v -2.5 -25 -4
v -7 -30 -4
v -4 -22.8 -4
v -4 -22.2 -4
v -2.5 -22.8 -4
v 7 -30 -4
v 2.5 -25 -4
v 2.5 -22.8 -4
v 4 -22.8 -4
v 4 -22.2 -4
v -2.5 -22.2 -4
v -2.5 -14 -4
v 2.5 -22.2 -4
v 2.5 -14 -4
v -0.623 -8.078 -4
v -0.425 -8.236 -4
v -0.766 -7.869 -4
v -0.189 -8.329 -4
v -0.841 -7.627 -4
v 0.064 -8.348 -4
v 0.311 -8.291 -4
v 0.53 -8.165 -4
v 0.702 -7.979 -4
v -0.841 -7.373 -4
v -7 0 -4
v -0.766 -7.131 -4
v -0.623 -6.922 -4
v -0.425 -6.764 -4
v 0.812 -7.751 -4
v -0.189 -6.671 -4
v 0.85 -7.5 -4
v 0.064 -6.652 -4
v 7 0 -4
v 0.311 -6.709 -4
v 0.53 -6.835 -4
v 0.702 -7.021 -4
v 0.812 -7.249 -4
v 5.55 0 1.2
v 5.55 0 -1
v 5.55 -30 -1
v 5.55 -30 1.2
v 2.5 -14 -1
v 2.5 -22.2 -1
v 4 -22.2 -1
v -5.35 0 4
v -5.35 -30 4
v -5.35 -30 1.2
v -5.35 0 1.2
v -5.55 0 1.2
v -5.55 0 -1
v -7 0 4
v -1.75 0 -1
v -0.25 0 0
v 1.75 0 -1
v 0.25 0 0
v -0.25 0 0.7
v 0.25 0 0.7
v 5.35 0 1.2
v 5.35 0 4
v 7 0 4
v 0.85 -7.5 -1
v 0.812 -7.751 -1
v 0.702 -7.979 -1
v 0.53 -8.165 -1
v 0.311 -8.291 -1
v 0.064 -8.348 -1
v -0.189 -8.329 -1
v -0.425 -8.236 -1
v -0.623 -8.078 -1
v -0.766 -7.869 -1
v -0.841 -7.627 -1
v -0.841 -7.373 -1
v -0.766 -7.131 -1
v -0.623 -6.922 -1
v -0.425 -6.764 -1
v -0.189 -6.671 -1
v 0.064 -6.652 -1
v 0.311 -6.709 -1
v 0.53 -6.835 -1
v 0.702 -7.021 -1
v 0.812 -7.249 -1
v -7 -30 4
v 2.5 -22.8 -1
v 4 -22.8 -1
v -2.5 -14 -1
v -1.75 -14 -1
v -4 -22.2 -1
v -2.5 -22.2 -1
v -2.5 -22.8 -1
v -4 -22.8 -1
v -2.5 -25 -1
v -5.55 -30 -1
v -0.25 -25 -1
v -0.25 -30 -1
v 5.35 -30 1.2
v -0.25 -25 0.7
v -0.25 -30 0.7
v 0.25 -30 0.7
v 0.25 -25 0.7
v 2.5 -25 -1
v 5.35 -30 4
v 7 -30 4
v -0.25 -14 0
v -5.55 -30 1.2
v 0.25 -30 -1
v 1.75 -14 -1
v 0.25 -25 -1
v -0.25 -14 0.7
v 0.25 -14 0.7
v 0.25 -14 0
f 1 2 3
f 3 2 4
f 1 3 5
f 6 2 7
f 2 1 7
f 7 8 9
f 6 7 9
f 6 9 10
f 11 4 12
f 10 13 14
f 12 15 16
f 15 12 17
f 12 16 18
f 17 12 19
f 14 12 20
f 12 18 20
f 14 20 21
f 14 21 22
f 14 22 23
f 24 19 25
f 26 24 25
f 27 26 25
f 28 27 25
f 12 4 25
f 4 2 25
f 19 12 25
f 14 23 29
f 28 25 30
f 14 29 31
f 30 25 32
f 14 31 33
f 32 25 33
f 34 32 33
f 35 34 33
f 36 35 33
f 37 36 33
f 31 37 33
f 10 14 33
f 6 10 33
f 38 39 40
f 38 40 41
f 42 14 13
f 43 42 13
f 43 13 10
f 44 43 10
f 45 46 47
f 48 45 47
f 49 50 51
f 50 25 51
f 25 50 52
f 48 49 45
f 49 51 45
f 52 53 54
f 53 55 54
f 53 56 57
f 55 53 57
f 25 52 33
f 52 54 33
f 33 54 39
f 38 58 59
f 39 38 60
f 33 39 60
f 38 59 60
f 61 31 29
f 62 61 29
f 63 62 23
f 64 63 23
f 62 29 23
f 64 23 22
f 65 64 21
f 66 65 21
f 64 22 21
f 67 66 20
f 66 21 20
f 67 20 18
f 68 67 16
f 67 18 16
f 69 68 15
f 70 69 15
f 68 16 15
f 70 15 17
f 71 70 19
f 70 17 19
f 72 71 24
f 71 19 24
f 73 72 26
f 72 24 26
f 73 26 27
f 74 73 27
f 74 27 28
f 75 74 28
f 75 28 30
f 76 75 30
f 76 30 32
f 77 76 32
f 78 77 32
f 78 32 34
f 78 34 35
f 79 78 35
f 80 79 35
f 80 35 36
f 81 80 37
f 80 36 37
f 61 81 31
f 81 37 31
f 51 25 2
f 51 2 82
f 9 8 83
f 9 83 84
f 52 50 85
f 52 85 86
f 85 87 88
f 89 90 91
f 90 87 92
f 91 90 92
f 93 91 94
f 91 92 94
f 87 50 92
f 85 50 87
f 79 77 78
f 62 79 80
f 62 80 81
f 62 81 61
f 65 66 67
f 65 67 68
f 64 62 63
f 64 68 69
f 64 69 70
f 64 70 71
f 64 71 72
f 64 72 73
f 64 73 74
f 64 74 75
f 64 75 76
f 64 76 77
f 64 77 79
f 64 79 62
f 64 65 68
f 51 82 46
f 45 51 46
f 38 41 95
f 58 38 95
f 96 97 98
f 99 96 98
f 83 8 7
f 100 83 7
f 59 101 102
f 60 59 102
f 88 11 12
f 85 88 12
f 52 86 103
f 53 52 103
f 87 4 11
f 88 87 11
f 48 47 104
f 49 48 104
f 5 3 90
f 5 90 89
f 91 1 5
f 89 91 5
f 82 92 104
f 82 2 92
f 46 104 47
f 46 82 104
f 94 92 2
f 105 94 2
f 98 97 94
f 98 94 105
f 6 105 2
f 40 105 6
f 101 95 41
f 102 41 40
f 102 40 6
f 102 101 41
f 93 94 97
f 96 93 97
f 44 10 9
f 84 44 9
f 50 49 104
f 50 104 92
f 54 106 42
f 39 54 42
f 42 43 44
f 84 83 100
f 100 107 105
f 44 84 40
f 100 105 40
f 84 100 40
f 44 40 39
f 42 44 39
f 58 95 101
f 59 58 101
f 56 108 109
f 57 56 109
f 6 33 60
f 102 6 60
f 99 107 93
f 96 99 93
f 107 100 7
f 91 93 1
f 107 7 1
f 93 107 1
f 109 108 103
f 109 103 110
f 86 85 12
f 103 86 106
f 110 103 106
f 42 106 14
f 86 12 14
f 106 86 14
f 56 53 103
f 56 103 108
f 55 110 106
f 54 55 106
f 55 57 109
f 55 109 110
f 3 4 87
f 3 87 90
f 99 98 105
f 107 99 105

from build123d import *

# Parameters (mm, degrees)
F0_W     = 14
F0_H     = 8
F1_DEPTH = 30
F3_W     = 1.5
F3_H     = 0.6
F4_DEPTH = 8
F5_DEPTH = 30.001
F7_DEPTH = 5
F8_R     = 0.85
F9_DEPTH = 3


# Not quite as in the source:
# - a feature names something its author has since deleted; it is built from what else it names


with BuildPart() as f1:
    # F0 (on Front) → F1 (new body)
    with BuildSketch(Plane.XZ):
        Rectangle(F0_W, F0_H)
    extrude(amount=F1_DEPTH)

    # F3 (on face) → F4 (cut, through all)
    with BuildSketch(Plane(origin=(0, 0, -4), x_dir=(1, 0, 0), z_dir=(0, 0, -1))):
        with Locations((3.25, 22.5)):
            Rectangle(F3_W, F3_H)
        Polygon((-2.5, 14), (2.5, 14), (2.5, 22.2), (2.5, 22.8), (2.5, 25), (-2.5, 25), (-2.5, 22.8), (-2.5, 22.2), align=None)
        with Locations((-3.25, 22.5)):
            Rectangle(F3_W, F3_H)
    extrude(amount=-F4_DEPTH, mode=Mode.SUBTRACT)

    # F2 (on face) → F5 (cut, through all)
    with BuildSketch(Plane.XZ.offset(30)):
        Polygon((-0.25, 0), (-0.25, 0.7), (0.25, 0.7), (0.25, 0), (1.75, -1), (5.55, -1), (5.55, 1.2), (5.35, 1.2), (5.35, 4), (-5.35, 4), (-5.35, 1.2), (-5.55, 1.2), (-5.55, -1), (-1.75, -1), align=None)
    extrude(amount=-F5_DEPTH, mode=Mode.SUBTRACT)

    # F6 (on face) → F7 (cut, through all)
    with BuildSketch(Plane.XZ.offset(30)):
        Polygon((-0.25, -1), (-0.25, 0), (-1.75, -1), align=None)
        Polygon((1.75, -1), (0.25, 0), (0.25, -1), align=None)
    extrude(amount=-F7_DEPTH, mode=Mode.SUBTRACT)

    # F8 (on face) → F9 (cut)
    with BuildSketch(Plane(origin=(0, 0, -4), x_dir=(1, 0, 0), z_dir=(0, 0, -1))):
        with Locations((0, 7.5)):
            Circle(F8_R)
    extrude(amount=-F9_DEPTH, mode=Mode.SUBTRACT)


solid = f1.part
